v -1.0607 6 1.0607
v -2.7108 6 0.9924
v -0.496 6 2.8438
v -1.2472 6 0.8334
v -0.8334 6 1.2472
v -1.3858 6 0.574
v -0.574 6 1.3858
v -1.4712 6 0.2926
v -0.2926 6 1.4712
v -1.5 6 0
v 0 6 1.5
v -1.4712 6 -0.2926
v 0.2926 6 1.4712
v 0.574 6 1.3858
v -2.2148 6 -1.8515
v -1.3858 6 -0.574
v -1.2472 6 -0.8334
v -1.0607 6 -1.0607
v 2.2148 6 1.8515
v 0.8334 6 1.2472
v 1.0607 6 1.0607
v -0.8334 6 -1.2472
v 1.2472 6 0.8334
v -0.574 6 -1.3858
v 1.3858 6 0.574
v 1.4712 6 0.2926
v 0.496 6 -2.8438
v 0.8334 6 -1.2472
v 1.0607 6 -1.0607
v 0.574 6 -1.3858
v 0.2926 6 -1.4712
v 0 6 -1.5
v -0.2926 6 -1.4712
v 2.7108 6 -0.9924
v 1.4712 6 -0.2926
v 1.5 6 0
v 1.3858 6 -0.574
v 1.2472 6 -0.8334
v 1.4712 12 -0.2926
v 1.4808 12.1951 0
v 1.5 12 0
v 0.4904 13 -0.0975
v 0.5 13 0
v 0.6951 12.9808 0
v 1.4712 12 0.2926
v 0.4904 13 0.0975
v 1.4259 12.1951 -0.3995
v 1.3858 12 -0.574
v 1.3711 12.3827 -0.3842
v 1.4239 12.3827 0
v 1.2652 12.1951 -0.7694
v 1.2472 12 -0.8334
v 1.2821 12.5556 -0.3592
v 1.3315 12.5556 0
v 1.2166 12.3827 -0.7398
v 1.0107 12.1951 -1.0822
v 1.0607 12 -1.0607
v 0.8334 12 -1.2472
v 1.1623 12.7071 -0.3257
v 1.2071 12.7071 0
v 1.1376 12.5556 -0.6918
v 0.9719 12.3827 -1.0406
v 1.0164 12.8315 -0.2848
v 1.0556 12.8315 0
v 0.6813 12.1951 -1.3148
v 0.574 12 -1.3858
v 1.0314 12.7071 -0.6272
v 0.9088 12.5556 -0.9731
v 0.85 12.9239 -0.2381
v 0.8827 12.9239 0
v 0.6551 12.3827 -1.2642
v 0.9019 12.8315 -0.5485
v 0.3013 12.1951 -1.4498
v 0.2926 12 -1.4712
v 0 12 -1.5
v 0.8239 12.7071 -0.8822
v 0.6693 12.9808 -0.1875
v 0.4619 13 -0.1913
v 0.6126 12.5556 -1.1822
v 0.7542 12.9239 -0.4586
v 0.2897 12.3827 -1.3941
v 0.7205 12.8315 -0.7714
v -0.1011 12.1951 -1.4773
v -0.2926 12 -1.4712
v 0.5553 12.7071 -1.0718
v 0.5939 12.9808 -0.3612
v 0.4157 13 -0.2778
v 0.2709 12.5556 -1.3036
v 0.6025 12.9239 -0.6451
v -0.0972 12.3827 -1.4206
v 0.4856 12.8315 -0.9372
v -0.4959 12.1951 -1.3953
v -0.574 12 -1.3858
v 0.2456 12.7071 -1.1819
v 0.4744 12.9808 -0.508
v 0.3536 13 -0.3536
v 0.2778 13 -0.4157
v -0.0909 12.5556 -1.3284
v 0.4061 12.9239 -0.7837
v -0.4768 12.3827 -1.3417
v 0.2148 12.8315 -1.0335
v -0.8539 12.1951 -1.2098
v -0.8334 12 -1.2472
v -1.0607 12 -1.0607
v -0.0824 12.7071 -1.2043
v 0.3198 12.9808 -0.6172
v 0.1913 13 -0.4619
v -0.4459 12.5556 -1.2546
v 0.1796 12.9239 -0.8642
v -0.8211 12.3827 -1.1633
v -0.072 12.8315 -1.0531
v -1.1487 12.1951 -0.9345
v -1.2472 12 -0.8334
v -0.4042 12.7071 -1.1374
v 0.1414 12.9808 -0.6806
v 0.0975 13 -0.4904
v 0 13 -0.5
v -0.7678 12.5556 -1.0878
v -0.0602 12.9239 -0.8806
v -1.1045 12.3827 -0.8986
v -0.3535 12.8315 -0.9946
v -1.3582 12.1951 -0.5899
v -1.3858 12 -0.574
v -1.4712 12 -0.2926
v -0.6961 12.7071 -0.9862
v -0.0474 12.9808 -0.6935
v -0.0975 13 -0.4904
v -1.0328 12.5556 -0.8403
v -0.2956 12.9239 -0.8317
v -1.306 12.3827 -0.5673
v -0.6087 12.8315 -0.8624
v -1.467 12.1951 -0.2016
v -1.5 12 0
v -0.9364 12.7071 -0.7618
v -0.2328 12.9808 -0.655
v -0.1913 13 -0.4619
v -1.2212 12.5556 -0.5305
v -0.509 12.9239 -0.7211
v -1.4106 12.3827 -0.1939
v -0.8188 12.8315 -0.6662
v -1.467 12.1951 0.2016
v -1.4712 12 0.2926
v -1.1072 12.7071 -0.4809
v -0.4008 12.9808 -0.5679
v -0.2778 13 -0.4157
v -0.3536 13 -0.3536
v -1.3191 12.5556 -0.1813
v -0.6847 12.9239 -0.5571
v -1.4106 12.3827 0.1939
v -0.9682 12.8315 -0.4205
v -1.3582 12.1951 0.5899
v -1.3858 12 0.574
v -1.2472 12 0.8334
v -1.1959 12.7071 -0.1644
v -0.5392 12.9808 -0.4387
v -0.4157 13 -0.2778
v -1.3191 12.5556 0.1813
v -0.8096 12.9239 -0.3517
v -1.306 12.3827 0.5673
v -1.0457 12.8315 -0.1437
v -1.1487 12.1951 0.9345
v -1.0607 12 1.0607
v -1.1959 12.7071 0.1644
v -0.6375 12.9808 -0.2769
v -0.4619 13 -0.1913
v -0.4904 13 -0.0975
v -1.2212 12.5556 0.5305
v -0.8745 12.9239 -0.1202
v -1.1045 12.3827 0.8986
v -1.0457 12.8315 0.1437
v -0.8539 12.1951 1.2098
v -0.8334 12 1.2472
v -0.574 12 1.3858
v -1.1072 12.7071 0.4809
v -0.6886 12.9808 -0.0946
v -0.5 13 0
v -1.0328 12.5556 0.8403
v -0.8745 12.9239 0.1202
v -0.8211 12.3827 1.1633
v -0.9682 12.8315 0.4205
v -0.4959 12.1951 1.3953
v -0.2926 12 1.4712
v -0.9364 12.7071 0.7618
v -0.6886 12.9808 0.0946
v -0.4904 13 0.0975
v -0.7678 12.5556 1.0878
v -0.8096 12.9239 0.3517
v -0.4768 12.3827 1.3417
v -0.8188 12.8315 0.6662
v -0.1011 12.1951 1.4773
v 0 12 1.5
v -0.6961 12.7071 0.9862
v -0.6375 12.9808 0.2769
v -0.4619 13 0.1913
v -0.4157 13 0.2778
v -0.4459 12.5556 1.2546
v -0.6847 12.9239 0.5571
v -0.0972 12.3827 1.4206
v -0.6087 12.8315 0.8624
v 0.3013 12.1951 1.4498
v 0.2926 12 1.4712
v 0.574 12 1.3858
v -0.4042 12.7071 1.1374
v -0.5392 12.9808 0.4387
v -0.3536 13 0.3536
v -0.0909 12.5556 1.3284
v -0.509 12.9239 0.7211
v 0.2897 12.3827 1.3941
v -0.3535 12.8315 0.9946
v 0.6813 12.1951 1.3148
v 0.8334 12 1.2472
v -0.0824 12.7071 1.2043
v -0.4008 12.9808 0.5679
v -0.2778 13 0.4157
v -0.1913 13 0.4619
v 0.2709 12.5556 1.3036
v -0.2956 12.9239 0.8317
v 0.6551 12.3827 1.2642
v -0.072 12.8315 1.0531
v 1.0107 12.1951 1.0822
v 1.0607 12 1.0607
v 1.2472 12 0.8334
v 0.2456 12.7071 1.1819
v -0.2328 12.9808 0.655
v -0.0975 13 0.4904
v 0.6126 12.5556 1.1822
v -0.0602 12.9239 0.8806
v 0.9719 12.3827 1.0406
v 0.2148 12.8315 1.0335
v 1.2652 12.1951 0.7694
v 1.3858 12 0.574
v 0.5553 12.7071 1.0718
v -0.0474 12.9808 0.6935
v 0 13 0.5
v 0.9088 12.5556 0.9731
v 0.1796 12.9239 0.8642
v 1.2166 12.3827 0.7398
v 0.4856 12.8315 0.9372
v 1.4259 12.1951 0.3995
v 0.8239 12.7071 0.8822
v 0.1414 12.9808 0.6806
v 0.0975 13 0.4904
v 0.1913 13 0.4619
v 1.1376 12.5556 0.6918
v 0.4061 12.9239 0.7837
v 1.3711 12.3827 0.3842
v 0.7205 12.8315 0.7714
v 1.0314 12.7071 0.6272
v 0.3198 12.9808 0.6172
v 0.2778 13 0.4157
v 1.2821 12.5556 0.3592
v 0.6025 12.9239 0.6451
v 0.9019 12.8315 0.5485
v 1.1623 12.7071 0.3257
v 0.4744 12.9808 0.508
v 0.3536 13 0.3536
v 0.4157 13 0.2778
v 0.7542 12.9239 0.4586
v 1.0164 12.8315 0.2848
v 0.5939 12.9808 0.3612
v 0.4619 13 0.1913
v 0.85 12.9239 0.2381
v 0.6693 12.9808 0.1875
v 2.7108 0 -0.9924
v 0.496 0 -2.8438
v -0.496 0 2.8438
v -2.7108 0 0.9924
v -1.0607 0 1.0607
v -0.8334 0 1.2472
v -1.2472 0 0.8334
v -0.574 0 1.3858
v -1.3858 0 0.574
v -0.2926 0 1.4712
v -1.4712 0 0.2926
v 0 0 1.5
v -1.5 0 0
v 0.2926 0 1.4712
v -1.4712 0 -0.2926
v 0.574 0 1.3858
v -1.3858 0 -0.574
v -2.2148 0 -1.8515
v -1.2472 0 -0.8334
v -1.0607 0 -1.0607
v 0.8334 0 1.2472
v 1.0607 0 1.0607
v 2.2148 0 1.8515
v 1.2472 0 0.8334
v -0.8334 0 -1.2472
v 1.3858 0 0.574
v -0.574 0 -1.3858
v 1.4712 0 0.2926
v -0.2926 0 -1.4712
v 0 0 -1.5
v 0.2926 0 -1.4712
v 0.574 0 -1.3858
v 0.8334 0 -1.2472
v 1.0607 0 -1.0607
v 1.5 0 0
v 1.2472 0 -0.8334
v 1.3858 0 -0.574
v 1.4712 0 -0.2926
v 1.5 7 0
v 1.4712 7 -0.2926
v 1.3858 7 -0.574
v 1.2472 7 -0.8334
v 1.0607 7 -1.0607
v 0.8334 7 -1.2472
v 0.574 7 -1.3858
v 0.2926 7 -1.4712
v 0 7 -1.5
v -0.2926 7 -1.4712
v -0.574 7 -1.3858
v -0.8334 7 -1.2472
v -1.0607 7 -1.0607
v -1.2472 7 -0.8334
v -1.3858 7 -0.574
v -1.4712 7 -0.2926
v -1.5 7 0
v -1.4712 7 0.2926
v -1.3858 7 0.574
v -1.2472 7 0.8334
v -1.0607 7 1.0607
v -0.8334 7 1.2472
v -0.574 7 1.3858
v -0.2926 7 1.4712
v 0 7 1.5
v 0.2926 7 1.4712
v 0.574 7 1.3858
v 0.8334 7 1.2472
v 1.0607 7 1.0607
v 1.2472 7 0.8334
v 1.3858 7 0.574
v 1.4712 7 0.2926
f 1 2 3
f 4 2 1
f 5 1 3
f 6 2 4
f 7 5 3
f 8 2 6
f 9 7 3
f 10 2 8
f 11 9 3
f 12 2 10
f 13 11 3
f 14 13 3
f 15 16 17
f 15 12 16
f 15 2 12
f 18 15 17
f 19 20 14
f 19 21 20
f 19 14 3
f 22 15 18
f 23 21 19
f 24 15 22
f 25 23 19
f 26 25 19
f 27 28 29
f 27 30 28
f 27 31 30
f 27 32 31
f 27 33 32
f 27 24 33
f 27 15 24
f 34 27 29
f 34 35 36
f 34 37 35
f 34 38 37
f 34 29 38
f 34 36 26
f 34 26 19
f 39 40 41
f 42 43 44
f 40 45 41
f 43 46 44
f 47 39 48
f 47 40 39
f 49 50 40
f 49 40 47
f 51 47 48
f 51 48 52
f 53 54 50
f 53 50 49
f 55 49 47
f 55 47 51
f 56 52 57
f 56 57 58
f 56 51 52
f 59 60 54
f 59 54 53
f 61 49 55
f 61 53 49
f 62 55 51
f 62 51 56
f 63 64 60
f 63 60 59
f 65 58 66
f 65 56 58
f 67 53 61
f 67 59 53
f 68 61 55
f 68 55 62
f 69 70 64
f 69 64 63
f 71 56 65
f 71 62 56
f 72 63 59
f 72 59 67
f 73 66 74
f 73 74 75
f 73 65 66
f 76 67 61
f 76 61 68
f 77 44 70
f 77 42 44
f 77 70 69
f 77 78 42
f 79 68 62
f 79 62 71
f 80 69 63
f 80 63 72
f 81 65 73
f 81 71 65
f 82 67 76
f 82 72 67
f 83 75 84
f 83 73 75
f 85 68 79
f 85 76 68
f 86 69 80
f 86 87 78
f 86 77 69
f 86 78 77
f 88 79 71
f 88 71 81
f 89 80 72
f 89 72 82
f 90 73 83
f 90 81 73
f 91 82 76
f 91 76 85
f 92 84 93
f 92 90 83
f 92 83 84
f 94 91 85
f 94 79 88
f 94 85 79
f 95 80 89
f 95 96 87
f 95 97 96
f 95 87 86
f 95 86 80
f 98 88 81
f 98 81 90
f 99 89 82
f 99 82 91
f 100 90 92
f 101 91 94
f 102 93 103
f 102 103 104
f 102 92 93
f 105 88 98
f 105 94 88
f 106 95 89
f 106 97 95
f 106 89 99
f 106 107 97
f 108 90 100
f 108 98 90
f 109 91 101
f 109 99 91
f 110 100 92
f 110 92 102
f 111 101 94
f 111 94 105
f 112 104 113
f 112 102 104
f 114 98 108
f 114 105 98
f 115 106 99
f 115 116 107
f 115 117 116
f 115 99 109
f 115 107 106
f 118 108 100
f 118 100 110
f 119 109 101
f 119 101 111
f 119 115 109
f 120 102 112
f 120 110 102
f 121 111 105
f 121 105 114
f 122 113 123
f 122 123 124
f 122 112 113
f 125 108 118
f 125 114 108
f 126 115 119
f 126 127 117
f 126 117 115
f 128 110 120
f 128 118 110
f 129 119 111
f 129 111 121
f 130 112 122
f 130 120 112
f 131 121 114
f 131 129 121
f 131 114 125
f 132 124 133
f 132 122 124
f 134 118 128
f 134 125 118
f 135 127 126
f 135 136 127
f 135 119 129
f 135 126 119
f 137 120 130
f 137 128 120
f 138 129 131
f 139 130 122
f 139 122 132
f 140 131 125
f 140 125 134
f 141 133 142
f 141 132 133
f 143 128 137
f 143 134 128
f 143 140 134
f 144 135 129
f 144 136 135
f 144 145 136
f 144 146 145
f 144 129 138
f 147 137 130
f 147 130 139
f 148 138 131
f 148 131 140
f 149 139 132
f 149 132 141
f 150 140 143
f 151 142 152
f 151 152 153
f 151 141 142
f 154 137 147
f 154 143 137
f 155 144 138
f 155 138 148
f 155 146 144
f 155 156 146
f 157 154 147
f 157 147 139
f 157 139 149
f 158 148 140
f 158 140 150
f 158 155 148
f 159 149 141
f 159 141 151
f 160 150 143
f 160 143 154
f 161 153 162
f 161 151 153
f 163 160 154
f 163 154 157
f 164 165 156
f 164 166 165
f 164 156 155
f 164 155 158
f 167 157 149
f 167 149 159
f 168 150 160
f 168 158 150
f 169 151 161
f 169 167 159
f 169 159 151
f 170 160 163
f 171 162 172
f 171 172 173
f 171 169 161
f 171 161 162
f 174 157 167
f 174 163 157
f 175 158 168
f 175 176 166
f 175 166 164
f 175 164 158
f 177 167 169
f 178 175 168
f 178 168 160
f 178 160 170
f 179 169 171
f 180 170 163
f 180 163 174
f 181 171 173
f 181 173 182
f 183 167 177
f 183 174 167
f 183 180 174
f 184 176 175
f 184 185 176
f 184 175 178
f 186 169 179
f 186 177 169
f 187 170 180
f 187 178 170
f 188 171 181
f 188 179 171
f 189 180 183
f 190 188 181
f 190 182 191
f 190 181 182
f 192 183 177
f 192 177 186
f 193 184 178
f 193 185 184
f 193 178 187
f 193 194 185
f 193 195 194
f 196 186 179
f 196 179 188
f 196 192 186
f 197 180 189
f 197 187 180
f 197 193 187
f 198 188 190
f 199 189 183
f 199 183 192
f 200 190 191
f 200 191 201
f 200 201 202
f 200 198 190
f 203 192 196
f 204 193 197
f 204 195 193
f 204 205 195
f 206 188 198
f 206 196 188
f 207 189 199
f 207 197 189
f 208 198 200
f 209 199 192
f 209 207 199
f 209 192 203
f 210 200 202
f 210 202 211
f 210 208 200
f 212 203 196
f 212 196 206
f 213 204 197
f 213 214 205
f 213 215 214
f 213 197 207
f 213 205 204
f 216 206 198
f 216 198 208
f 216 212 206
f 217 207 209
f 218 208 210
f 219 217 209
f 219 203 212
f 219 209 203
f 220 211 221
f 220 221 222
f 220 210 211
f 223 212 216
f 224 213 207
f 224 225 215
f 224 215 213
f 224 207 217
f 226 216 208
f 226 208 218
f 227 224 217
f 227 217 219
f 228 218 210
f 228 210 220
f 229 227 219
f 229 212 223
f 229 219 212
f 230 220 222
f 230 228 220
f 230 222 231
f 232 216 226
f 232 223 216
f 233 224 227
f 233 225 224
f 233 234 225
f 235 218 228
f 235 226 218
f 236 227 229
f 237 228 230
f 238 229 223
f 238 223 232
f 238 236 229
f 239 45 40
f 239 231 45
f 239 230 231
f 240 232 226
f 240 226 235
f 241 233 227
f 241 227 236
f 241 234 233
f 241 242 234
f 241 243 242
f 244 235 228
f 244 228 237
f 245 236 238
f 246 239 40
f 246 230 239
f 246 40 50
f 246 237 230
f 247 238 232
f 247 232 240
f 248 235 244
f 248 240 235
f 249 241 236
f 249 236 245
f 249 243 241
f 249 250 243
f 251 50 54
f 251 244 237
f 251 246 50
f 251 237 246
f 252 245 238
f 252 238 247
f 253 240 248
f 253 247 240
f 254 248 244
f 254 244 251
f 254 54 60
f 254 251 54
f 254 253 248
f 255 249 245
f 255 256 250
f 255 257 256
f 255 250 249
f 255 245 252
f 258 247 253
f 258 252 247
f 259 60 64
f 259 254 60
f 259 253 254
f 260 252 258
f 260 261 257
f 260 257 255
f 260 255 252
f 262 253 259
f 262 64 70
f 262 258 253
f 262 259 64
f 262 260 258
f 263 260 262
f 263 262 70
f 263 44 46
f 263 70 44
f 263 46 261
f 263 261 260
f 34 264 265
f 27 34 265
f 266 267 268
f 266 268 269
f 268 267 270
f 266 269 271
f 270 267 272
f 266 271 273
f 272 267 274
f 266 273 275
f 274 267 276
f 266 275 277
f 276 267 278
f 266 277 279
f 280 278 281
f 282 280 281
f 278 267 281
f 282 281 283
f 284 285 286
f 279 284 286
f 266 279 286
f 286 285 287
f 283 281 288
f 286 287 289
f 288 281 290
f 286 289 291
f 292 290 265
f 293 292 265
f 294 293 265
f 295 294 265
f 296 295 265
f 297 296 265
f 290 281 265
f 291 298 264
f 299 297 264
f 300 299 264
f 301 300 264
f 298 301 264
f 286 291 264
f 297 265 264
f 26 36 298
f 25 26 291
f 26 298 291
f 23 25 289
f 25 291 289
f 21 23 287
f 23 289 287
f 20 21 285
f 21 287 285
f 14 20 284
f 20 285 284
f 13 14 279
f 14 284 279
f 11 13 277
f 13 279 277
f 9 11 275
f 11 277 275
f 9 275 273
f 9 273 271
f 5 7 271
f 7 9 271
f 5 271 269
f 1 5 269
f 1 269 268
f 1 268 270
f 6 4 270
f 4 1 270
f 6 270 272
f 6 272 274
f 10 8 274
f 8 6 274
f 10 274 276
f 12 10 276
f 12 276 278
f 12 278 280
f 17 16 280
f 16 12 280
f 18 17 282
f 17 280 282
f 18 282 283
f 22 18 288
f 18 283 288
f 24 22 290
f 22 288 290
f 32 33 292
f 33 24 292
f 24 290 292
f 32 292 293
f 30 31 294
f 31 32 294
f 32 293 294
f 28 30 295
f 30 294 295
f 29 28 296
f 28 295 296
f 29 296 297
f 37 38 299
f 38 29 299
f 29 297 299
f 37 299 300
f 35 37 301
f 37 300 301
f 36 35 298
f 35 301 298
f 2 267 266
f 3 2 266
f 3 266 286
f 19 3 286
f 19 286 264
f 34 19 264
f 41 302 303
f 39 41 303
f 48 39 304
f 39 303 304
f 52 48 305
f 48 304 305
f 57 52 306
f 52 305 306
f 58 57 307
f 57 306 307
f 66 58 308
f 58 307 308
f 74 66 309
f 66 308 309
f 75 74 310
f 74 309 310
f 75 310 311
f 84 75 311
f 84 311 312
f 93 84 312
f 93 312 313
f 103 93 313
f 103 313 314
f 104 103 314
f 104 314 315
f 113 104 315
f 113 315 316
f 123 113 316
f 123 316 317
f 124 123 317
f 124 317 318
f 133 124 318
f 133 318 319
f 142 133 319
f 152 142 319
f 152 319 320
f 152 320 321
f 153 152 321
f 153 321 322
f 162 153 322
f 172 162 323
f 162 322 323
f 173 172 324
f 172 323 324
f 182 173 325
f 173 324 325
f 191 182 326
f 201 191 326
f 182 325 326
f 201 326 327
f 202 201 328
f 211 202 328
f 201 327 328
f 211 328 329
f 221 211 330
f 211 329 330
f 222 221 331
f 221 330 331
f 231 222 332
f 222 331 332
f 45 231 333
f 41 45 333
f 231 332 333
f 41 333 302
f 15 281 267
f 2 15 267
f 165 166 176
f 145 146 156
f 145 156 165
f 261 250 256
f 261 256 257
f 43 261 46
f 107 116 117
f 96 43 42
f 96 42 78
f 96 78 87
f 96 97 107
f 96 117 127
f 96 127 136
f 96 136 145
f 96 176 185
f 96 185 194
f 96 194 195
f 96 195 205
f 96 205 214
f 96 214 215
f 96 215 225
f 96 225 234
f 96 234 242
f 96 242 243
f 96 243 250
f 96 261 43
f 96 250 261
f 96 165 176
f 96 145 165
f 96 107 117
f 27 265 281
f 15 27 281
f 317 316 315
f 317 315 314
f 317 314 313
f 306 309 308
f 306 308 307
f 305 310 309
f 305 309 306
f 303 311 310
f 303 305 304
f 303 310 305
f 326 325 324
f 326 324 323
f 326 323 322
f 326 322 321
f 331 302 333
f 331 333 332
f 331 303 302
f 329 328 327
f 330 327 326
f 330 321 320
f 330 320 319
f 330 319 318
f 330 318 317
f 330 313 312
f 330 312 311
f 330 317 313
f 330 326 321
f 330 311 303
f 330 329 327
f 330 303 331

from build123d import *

# Parameters (mm, degrees)
BOSS_EXTRUDE1_DEPTH = 6
SKETCH2_R           = 1.5
BOSS_EXTRUDE2_DEPTH = 7
SKETCH3_R           = 1.5
CUT_EXTRUDE1_DEPTH  = 7
FILLET1_R           = 1


with BuildPart() as part:
    # Sketch1 → Boss-Extrude1 (new body)
    with BuildSketch(Plane(origin=(0, 0, 0), x_dir=(1, 0, 0), z_dir=(0, 1, 0))):
        Polygon((2.214824591, -1.851454932), (2.7108193, 0.992366895), (0.495994709, 2.843821827), (-2.214824591, 1.851454932), (-2.7108193, -0.992366895), (-0.495994709, -2.843821827), align=None)
    extrude(amount=BOSS_EXTRUDE1_DEPTH)

    # Sketch2 → Boss-Extrude2 (add)
    with BuildSketch(Plane(origin=(0, 6, 0), x_dir=(1, 0, 0), z_dir=(0, 1, 0))):
        Circle(SKETCH2_R)
    extrude(amount=BOSS_EXTRUDE2_DEPTH)

    # Sketch3 → Cut-Extrude1 (cut)
    with BuildSketch(Plane.XZ):
        Circle(SKETCH3_R)
    extrude(amount=-CUT_EXTRUDE1_DEPTH, mode=Mode.SUBTRACT)

    # Fillet1
    fillet1_edges = [part.edges().sort_by_distance(p)[0] for p in [
        (-1.5, 13, 0),
    ]]
    fillet(fillet1_edges, radius=FILLET1_R)


solid = part.part
